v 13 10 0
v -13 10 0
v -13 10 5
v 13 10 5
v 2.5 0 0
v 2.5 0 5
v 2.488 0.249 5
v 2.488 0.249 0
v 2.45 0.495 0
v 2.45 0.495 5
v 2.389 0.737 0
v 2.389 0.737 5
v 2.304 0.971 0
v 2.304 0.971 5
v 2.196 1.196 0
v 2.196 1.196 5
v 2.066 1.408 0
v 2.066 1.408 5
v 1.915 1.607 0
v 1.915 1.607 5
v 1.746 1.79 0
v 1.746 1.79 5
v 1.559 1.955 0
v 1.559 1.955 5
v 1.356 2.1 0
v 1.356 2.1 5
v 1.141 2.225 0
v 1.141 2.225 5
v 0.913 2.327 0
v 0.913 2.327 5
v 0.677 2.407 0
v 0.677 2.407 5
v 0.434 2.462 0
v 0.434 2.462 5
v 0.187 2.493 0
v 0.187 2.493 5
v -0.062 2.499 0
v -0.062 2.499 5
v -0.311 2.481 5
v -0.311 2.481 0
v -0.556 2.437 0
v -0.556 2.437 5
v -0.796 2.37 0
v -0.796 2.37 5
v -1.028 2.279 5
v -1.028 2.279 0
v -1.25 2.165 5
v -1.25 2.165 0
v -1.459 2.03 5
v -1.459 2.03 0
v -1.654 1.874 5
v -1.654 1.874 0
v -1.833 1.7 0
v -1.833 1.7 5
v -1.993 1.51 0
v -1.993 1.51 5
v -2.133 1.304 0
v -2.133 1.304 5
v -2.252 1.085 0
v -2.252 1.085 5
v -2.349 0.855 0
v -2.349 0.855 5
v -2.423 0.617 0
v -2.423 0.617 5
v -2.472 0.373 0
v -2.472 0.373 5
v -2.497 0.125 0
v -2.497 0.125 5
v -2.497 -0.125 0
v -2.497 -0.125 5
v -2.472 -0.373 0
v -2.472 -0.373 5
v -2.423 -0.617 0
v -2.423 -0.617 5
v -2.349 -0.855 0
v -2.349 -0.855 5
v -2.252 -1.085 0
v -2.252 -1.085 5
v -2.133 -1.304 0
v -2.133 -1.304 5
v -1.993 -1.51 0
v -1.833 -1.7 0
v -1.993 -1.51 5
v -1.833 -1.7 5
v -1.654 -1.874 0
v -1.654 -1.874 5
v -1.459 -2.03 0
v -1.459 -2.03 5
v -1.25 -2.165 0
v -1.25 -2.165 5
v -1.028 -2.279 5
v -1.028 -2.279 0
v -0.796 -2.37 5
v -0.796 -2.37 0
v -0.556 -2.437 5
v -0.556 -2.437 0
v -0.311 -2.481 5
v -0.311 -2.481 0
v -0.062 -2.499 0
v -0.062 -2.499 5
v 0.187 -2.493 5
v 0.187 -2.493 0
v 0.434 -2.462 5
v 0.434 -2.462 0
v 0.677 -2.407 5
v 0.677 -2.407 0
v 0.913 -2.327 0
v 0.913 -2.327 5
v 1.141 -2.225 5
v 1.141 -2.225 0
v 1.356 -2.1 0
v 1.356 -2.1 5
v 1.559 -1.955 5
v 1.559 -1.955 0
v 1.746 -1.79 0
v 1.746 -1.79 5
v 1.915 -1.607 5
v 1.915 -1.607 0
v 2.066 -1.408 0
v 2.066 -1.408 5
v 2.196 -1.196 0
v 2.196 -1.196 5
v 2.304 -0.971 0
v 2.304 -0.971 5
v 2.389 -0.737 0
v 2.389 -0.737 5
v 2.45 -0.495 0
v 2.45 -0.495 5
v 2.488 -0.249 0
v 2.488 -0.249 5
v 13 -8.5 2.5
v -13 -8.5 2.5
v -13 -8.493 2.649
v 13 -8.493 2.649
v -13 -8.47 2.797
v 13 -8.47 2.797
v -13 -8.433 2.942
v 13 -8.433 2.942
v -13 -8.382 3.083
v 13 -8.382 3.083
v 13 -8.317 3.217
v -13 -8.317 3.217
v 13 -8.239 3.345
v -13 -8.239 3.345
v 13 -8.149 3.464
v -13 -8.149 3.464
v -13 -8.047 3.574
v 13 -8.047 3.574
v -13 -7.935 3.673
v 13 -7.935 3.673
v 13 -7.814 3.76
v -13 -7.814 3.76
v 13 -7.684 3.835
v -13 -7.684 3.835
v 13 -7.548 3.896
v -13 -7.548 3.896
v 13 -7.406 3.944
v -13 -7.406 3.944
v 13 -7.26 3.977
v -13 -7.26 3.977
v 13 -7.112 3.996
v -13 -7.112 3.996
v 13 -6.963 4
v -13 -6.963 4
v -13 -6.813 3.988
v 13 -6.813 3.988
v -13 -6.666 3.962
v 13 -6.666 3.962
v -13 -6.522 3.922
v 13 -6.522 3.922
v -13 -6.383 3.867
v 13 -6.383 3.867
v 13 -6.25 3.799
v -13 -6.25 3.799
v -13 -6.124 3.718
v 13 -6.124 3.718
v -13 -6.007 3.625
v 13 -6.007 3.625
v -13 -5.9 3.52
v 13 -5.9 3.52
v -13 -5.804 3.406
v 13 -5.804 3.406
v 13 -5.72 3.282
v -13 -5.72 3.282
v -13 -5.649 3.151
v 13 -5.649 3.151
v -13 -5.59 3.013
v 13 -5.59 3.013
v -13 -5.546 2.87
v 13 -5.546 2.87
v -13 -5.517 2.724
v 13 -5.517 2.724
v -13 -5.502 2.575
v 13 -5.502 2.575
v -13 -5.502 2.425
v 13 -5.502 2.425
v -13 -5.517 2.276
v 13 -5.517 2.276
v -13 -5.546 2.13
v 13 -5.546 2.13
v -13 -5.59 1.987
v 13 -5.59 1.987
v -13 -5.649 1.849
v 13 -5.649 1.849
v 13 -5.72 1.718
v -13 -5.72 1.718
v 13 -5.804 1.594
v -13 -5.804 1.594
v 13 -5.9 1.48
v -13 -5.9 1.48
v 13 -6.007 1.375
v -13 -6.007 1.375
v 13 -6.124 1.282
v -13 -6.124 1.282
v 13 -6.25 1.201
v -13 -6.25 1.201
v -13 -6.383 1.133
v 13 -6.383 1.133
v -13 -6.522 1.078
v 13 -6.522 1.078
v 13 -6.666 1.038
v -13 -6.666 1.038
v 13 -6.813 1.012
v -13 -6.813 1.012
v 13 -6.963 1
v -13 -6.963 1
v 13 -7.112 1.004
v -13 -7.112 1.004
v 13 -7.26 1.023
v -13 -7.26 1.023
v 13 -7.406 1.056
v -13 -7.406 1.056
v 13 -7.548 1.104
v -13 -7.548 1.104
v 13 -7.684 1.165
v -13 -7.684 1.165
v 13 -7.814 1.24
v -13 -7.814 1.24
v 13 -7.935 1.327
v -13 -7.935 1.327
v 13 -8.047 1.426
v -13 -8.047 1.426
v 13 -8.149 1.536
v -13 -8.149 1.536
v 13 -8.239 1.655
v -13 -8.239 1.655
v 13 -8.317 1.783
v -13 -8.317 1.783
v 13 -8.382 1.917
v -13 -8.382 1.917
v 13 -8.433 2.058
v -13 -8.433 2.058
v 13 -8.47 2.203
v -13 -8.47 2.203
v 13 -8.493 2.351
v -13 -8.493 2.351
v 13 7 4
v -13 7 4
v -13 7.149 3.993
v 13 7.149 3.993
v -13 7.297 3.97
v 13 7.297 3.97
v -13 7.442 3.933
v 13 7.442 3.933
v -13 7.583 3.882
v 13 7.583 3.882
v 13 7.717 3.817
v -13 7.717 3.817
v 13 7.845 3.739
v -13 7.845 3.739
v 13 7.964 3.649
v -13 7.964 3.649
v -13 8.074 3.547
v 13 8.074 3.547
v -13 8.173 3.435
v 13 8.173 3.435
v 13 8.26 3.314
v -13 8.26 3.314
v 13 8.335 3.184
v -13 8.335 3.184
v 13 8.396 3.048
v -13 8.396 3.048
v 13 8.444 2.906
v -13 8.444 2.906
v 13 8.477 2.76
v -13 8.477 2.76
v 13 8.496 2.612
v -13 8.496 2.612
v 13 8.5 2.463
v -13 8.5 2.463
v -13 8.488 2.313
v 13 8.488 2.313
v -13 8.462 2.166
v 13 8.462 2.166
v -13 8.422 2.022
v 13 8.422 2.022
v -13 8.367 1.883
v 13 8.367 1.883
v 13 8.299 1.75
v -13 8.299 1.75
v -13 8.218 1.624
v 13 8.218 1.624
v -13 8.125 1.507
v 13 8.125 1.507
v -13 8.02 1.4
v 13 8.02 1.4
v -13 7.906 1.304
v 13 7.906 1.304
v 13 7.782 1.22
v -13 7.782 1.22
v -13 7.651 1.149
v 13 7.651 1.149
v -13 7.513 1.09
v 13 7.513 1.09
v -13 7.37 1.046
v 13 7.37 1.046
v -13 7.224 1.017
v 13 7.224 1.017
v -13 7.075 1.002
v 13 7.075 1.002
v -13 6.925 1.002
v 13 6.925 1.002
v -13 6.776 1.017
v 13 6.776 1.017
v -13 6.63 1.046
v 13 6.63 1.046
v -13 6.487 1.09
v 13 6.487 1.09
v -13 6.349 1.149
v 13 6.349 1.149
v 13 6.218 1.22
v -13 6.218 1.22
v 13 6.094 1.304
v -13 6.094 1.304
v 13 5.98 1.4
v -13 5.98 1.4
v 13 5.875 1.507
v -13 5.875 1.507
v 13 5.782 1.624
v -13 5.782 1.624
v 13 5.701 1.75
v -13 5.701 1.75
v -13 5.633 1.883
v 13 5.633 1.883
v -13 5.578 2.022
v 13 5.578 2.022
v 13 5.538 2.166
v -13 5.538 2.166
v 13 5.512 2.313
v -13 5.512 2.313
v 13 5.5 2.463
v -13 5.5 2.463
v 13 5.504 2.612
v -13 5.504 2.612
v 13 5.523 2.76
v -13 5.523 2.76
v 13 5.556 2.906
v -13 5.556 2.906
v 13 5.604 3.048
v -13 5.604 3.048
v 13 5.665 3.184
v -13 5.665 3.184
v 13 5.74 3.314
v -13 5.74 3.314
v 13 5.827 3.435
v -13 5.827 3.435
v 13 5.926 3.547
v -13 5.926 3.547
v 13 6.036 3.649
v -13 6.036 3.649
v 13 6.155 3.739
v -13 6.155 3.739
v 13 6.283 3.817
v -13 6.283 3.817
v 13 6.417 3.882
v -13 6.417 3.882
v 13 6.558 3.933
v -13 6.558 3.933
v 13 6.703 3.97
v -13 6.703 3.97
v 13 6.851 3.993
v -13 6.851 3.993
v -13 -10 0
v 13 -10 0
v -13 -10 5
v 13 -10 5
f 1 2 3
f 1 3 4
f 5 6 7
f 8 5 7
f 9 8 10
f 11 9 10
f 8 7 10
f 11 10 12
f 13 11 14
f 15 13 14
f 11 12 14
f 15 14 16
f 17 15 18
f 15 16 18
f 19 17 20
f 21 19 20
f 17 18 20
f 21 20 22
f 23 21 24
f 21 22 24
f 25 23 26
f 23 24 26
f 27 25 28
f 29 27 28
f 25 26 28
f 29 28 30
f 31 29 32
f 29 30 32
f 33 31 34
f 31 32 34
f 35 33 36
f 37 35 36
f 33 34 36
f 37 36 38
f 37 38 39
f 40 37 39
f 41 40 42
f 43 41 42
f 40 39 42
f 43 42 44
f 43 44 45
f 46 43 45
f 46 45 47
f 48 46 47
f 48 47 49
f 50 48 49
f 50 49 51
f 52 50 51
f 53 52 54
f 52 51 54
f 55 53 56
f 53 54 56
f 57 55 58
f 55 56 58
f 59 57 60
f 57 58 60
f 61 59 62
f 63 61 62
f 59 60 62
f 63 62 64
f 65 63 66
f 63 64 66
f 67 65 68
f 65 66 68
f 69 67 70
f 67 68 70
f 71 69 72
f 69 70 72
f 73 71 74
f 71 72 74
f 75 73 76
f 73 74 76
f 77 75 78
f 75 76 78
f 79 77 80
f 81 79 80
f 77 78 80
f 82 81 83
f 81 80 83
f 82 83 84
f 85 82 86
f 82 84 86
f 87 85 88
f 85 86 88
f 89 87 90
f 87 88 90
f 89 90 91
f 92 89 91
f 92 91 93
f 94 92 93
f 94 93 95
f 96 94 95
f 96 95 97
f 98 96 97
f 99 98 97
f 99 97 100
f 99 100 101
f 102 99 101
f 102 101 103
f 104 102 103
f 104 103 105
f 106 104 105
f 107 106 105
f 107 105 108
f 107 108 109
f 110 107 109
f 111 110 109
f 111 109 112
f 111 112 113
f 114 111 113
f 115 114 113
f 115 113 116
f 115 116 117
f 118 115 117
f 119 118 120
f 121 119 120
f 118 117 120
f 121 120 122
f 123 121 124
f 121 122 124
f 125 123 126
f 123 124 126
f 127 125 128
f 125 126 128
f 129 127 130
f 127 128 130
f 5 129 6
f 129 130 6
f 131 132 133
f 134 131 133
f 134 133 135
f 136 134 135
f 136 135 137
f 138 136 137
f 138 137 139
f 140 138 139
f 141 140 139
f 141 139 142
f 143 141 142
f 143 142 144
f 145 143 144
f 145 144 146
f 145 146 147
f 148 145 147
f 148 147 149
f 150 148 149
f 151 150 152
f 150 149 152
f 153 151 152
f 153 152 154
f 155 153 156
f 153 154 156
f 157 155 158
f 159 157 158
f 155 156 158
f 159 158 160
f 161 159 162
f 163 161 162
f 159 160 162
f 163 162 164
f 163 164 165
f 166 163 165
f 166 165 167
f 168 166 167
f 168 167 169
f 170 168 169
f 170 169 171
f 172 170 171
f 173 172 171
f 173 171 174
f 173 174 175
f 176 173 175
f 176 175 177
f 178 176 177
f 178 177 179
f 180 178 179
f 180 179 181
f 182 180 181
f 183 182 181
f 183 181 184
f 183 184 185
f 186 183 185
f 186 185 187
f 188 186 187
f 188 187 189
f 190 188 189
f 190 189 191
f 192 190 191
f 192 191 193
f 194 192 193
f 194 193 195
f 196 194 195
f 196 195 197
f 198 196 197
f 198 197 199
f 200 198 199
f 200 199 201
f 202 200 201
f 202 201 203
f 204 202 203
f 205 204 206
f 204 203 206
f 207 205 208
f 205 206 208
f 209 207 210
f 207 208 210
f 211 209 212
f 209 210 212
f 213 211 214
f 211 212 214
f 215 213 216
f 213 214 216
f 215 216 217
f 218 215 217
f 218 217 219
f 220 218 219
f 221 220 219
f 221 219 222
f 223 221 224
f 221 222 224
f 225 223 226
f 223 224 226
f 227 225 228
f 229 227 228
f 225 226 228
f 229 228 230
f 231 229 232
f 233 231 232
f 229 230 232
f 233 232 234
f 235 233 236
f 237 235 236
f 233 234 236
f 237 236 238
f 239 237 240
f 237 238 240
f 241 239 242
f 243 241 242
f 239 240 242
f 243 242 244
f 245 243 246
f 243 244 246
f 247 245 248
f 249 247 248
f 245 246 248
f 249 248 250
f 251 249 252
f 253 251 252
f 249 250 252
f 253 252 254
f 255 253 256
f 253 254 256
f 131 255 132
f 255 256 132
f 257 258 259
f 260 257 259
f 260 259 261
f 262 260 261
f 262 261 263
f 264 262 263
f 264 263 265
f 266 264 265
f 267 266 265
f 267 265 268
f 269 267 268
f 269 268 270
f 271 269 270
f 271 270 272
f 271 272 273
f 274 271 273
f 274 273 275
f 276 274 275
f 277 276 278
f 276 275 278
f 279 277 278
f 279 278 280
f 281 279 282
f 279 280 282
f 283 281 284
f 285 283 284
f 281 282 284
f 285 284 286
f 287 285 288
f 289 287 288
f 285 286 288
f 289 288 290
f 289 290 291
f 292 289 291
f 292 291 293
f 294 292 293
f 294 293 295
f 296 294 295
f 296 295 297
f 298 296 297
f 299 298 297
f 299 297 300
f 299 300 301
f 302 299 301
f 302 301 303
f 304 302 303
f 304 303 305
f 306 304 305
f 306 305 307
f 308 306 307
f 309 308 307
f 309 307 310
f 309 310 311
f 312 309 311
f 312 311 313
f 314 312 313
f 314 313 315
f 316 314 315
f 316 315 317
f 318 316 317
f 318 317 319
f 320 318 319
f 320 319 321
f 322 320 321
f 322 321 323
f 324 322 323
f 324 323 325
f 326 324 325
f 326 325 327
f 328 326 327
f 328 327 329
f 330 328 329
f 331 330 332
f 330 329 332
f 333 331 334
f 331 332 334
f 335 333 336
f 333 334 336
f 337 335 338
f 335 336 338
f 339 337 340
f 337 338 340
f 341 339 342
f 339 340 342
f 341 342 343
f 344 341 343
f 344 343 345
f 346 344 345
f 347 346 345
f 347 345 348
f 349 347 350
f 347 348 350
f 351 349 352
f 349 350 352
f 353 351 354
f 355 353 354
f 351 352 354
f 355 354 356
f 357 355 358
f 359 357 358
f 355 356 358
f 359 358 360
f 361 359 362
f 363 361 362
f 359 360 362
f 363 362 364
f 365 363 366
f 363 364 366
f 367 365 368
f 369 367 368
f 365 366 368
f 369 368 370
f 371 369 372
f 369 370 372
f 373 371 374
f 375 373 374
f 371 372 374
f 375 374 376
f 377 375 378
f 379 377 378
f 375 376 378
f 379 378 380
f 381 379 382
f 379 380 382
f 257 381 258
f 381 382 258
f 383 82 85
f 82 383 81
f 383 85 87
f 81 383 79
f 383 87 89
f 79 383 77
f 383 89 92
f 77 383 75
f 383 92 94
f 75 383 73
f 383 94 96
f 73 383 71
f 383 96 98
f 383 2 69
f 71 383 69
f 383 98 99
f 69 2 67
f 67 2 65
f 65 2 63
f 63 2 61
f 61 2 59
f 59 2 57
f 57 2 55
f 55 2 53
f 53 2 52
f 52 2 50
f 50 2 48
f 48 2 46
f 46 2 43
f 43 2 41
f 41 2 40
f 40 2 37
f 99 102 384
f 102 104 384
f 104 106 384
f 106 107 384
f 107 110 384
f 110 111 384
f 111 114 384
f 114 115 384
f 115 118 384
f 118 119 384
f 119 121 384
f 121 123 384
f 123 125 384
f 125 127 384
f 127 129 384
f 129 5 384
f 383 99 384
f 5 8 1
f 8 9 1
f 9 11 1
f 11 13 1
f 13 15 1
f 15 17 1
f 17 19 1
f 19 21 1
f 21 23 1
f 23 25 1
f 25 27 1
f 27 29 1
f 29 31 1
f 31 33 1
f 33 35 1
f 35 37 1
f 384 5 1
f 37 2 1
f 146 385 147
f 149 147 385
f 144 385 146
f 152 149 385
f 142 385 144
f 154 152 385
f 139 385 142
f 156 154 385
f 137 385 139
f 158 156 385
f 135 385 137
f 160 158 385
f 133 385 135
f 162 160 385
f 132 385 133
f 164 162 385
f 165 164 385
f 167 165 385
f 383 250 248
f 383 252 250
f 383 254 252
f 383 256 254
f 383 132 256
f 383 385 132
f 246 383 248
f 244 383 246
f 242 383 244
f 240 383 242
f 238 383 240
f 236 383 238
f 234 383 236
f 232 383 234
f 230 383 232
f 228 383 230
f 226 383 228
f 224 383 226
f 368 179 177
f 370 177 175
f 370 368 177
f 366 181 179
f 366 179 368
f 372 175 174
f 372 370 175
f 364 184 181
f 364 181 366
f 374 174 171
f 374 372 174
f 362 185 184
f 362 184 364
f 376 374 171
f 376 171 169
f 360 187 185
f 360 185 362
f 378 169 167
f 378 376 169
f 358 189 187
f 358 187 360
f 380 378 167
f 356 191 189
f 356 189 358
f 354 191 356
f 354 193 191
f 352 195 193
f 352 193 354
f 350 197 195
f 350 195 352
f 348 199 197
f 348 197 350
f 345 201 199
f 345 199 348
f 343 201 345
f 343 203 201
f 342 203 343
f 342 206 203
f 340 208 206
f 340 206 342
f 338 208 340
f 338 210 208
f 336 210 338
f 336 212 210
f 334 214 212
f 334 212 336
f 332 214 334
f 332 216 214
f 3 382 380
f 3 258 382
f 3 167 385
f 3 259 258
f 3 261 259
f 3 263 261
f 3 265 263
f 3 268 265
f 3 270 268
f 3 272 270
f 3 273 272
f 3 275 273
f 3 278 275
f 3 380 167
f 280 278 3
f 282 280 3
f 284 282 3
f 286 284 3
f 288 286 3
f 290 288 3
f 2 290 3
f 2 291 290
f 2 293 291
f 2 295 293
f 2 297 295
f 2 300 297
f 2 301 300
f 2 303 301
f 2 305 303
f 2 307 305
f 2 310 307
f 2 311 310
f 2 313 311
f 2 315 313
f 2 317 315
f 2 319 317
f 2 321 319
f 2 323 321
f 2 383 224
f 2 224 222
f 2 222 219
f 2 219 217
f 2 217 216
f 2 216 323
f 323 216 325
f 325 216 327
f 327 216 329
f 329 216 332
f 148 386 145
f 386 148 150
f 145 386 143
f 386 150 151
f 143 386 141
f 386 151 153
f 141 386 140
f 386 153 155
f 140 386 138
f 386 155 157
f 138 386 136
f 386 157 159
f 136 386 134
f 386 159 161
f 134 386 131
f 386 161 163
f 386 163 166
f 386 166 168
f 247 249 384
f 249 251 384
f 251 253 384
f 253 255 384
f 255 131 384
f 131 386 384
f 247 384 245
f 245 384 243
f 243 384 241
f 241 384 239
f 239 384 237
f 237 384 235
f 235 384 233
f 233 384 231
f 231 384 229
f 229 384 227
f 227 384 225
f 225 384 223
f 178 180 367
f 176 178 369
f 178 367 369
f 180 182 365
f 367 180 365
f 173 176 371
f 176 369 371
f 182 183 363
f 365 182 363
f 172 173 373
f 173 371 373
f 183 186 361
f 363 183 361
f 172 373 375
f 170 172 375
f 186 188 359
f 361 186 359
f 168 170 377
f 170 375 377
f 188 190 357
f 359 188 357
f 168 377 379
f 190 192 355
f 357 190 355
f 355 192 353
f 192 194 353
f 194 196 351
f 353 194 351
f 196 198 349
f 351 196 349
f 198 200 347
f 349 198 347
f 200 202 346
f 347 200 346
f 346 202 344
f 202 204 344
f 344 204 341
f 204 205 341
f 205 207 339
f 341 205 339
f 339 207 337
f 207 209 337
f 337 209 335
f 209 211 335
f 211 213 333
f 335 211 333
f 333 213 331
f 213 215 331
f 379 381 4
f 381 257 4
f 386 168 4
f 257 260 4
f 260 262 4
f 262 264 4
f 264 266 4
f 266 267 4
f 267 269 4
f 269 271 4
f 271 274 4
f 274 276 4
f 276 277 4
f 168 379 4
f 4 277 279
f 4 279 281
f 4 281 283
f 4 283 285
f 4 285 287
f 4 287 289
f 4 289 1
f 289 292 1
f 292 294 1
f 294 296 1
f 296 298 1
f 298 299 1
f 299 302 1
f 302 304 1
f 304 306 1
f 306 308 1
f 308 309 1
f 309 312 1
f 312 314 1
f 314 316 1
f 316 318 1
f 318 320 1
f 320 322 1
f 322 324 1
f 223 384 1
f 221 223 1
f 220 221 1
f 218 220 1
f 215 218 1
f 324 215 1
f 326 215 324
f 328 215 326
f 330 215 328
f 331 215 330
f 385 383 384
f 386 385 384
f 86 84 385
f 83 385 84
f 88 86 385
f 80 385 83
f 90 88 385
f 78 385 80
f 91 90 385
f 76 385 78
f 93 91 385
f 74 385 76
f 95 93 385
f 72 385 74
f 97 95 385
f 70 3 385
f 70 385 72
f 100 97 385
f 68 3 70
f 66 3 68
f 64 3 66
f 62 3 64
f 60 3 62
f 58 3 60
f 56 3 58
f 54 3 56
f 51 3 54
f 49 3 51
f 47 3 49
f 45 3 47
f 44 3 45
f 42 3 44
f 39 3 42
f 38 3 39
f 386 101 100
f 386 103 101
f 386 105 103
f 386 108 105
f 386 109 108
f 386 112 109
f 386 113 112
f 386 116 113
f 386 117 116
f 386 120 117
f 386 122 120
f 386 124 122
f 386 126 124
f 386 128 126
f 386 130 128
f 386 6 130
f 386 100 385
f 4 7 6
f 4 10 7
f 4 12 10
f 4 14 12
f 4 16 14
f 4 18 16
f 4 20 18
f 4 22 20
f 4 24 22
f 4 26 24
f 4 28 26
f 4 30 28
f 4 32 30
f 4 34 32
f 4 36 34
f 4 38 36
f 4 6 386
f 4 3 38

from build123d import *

# Parameters (mm, degrees)
SKETCH1_W           = 26
SKETCH1_H           = 20
BOSS_EXTRUDE1_DEPTH = 5
SKETCH2_R           = 2.5
CUT_EXTRUDE1_DEPTH  = 5
CUT_EXTRUDE2_REACH  = 30.302
SKETCH3_R           = 1.5


with BuildPart() as part:
    # Sketch1 → Boss-Extrude1 (new body)
    with BuildSketch(Plane.XY):
        Rectangle(SKETCH1_W, SKETCH1_H)
    extrude(amount=BOSS_EXTRUDE1_DEPTH)

    # Sketch2 → Cut-Extrude1 (cut)
    with BuildSketch(Plane.XY.offset(5)):
        Circle(SKETCH2_R)
    extrude(amount=-CUT_EXTRUDE1_DEPTH, mode=Mode.SUBTRACT)

    # Sketch3 → Cut-Extrude2 (cut, up to next)
    with BuildSketch(Plane.ZY.offset(13), mode=Mode.PRIVATE) as cut_extrude2_sk1:
        with Locations((2.5, 7)):
            Circle(SKETCH3_R)
    cut_extrude2_tool1 = extrude(cut_extrude2_sk1.sketch, amount=-CUT_EXTRUDE2_REACH, mode=Mode.PRIVATE) & part.part
    # Sketch3 → Cut-Extrude2 (cut, up to next)
    with BuildSketch(Plane.ZY.offset(13), mode=Mode.PRIVATE) as cut_extrude2_sk2:
        with Locations(Location((2.5, -7, 0), (0, 0, 270))):
            Circle(SKETCH3_R)
    cut_extrude2_tool2 = extrude(cut_extrude2_sk2.sketch, amount=-CUT_EXTRUDE2_REACH, mode=Mode.PRIVATE) & part.part
    add(cut_extrude2_tool1.solids().sort_by_distance((-13, 7, 2.5))[0], mode=Mode.SUBTRACT)
    add(cut_extrude2_tool2.solids().sort_by_distance((-13, -7, 2.5))[0], mode=Mode.SUBTRACT)


solid = part.part
